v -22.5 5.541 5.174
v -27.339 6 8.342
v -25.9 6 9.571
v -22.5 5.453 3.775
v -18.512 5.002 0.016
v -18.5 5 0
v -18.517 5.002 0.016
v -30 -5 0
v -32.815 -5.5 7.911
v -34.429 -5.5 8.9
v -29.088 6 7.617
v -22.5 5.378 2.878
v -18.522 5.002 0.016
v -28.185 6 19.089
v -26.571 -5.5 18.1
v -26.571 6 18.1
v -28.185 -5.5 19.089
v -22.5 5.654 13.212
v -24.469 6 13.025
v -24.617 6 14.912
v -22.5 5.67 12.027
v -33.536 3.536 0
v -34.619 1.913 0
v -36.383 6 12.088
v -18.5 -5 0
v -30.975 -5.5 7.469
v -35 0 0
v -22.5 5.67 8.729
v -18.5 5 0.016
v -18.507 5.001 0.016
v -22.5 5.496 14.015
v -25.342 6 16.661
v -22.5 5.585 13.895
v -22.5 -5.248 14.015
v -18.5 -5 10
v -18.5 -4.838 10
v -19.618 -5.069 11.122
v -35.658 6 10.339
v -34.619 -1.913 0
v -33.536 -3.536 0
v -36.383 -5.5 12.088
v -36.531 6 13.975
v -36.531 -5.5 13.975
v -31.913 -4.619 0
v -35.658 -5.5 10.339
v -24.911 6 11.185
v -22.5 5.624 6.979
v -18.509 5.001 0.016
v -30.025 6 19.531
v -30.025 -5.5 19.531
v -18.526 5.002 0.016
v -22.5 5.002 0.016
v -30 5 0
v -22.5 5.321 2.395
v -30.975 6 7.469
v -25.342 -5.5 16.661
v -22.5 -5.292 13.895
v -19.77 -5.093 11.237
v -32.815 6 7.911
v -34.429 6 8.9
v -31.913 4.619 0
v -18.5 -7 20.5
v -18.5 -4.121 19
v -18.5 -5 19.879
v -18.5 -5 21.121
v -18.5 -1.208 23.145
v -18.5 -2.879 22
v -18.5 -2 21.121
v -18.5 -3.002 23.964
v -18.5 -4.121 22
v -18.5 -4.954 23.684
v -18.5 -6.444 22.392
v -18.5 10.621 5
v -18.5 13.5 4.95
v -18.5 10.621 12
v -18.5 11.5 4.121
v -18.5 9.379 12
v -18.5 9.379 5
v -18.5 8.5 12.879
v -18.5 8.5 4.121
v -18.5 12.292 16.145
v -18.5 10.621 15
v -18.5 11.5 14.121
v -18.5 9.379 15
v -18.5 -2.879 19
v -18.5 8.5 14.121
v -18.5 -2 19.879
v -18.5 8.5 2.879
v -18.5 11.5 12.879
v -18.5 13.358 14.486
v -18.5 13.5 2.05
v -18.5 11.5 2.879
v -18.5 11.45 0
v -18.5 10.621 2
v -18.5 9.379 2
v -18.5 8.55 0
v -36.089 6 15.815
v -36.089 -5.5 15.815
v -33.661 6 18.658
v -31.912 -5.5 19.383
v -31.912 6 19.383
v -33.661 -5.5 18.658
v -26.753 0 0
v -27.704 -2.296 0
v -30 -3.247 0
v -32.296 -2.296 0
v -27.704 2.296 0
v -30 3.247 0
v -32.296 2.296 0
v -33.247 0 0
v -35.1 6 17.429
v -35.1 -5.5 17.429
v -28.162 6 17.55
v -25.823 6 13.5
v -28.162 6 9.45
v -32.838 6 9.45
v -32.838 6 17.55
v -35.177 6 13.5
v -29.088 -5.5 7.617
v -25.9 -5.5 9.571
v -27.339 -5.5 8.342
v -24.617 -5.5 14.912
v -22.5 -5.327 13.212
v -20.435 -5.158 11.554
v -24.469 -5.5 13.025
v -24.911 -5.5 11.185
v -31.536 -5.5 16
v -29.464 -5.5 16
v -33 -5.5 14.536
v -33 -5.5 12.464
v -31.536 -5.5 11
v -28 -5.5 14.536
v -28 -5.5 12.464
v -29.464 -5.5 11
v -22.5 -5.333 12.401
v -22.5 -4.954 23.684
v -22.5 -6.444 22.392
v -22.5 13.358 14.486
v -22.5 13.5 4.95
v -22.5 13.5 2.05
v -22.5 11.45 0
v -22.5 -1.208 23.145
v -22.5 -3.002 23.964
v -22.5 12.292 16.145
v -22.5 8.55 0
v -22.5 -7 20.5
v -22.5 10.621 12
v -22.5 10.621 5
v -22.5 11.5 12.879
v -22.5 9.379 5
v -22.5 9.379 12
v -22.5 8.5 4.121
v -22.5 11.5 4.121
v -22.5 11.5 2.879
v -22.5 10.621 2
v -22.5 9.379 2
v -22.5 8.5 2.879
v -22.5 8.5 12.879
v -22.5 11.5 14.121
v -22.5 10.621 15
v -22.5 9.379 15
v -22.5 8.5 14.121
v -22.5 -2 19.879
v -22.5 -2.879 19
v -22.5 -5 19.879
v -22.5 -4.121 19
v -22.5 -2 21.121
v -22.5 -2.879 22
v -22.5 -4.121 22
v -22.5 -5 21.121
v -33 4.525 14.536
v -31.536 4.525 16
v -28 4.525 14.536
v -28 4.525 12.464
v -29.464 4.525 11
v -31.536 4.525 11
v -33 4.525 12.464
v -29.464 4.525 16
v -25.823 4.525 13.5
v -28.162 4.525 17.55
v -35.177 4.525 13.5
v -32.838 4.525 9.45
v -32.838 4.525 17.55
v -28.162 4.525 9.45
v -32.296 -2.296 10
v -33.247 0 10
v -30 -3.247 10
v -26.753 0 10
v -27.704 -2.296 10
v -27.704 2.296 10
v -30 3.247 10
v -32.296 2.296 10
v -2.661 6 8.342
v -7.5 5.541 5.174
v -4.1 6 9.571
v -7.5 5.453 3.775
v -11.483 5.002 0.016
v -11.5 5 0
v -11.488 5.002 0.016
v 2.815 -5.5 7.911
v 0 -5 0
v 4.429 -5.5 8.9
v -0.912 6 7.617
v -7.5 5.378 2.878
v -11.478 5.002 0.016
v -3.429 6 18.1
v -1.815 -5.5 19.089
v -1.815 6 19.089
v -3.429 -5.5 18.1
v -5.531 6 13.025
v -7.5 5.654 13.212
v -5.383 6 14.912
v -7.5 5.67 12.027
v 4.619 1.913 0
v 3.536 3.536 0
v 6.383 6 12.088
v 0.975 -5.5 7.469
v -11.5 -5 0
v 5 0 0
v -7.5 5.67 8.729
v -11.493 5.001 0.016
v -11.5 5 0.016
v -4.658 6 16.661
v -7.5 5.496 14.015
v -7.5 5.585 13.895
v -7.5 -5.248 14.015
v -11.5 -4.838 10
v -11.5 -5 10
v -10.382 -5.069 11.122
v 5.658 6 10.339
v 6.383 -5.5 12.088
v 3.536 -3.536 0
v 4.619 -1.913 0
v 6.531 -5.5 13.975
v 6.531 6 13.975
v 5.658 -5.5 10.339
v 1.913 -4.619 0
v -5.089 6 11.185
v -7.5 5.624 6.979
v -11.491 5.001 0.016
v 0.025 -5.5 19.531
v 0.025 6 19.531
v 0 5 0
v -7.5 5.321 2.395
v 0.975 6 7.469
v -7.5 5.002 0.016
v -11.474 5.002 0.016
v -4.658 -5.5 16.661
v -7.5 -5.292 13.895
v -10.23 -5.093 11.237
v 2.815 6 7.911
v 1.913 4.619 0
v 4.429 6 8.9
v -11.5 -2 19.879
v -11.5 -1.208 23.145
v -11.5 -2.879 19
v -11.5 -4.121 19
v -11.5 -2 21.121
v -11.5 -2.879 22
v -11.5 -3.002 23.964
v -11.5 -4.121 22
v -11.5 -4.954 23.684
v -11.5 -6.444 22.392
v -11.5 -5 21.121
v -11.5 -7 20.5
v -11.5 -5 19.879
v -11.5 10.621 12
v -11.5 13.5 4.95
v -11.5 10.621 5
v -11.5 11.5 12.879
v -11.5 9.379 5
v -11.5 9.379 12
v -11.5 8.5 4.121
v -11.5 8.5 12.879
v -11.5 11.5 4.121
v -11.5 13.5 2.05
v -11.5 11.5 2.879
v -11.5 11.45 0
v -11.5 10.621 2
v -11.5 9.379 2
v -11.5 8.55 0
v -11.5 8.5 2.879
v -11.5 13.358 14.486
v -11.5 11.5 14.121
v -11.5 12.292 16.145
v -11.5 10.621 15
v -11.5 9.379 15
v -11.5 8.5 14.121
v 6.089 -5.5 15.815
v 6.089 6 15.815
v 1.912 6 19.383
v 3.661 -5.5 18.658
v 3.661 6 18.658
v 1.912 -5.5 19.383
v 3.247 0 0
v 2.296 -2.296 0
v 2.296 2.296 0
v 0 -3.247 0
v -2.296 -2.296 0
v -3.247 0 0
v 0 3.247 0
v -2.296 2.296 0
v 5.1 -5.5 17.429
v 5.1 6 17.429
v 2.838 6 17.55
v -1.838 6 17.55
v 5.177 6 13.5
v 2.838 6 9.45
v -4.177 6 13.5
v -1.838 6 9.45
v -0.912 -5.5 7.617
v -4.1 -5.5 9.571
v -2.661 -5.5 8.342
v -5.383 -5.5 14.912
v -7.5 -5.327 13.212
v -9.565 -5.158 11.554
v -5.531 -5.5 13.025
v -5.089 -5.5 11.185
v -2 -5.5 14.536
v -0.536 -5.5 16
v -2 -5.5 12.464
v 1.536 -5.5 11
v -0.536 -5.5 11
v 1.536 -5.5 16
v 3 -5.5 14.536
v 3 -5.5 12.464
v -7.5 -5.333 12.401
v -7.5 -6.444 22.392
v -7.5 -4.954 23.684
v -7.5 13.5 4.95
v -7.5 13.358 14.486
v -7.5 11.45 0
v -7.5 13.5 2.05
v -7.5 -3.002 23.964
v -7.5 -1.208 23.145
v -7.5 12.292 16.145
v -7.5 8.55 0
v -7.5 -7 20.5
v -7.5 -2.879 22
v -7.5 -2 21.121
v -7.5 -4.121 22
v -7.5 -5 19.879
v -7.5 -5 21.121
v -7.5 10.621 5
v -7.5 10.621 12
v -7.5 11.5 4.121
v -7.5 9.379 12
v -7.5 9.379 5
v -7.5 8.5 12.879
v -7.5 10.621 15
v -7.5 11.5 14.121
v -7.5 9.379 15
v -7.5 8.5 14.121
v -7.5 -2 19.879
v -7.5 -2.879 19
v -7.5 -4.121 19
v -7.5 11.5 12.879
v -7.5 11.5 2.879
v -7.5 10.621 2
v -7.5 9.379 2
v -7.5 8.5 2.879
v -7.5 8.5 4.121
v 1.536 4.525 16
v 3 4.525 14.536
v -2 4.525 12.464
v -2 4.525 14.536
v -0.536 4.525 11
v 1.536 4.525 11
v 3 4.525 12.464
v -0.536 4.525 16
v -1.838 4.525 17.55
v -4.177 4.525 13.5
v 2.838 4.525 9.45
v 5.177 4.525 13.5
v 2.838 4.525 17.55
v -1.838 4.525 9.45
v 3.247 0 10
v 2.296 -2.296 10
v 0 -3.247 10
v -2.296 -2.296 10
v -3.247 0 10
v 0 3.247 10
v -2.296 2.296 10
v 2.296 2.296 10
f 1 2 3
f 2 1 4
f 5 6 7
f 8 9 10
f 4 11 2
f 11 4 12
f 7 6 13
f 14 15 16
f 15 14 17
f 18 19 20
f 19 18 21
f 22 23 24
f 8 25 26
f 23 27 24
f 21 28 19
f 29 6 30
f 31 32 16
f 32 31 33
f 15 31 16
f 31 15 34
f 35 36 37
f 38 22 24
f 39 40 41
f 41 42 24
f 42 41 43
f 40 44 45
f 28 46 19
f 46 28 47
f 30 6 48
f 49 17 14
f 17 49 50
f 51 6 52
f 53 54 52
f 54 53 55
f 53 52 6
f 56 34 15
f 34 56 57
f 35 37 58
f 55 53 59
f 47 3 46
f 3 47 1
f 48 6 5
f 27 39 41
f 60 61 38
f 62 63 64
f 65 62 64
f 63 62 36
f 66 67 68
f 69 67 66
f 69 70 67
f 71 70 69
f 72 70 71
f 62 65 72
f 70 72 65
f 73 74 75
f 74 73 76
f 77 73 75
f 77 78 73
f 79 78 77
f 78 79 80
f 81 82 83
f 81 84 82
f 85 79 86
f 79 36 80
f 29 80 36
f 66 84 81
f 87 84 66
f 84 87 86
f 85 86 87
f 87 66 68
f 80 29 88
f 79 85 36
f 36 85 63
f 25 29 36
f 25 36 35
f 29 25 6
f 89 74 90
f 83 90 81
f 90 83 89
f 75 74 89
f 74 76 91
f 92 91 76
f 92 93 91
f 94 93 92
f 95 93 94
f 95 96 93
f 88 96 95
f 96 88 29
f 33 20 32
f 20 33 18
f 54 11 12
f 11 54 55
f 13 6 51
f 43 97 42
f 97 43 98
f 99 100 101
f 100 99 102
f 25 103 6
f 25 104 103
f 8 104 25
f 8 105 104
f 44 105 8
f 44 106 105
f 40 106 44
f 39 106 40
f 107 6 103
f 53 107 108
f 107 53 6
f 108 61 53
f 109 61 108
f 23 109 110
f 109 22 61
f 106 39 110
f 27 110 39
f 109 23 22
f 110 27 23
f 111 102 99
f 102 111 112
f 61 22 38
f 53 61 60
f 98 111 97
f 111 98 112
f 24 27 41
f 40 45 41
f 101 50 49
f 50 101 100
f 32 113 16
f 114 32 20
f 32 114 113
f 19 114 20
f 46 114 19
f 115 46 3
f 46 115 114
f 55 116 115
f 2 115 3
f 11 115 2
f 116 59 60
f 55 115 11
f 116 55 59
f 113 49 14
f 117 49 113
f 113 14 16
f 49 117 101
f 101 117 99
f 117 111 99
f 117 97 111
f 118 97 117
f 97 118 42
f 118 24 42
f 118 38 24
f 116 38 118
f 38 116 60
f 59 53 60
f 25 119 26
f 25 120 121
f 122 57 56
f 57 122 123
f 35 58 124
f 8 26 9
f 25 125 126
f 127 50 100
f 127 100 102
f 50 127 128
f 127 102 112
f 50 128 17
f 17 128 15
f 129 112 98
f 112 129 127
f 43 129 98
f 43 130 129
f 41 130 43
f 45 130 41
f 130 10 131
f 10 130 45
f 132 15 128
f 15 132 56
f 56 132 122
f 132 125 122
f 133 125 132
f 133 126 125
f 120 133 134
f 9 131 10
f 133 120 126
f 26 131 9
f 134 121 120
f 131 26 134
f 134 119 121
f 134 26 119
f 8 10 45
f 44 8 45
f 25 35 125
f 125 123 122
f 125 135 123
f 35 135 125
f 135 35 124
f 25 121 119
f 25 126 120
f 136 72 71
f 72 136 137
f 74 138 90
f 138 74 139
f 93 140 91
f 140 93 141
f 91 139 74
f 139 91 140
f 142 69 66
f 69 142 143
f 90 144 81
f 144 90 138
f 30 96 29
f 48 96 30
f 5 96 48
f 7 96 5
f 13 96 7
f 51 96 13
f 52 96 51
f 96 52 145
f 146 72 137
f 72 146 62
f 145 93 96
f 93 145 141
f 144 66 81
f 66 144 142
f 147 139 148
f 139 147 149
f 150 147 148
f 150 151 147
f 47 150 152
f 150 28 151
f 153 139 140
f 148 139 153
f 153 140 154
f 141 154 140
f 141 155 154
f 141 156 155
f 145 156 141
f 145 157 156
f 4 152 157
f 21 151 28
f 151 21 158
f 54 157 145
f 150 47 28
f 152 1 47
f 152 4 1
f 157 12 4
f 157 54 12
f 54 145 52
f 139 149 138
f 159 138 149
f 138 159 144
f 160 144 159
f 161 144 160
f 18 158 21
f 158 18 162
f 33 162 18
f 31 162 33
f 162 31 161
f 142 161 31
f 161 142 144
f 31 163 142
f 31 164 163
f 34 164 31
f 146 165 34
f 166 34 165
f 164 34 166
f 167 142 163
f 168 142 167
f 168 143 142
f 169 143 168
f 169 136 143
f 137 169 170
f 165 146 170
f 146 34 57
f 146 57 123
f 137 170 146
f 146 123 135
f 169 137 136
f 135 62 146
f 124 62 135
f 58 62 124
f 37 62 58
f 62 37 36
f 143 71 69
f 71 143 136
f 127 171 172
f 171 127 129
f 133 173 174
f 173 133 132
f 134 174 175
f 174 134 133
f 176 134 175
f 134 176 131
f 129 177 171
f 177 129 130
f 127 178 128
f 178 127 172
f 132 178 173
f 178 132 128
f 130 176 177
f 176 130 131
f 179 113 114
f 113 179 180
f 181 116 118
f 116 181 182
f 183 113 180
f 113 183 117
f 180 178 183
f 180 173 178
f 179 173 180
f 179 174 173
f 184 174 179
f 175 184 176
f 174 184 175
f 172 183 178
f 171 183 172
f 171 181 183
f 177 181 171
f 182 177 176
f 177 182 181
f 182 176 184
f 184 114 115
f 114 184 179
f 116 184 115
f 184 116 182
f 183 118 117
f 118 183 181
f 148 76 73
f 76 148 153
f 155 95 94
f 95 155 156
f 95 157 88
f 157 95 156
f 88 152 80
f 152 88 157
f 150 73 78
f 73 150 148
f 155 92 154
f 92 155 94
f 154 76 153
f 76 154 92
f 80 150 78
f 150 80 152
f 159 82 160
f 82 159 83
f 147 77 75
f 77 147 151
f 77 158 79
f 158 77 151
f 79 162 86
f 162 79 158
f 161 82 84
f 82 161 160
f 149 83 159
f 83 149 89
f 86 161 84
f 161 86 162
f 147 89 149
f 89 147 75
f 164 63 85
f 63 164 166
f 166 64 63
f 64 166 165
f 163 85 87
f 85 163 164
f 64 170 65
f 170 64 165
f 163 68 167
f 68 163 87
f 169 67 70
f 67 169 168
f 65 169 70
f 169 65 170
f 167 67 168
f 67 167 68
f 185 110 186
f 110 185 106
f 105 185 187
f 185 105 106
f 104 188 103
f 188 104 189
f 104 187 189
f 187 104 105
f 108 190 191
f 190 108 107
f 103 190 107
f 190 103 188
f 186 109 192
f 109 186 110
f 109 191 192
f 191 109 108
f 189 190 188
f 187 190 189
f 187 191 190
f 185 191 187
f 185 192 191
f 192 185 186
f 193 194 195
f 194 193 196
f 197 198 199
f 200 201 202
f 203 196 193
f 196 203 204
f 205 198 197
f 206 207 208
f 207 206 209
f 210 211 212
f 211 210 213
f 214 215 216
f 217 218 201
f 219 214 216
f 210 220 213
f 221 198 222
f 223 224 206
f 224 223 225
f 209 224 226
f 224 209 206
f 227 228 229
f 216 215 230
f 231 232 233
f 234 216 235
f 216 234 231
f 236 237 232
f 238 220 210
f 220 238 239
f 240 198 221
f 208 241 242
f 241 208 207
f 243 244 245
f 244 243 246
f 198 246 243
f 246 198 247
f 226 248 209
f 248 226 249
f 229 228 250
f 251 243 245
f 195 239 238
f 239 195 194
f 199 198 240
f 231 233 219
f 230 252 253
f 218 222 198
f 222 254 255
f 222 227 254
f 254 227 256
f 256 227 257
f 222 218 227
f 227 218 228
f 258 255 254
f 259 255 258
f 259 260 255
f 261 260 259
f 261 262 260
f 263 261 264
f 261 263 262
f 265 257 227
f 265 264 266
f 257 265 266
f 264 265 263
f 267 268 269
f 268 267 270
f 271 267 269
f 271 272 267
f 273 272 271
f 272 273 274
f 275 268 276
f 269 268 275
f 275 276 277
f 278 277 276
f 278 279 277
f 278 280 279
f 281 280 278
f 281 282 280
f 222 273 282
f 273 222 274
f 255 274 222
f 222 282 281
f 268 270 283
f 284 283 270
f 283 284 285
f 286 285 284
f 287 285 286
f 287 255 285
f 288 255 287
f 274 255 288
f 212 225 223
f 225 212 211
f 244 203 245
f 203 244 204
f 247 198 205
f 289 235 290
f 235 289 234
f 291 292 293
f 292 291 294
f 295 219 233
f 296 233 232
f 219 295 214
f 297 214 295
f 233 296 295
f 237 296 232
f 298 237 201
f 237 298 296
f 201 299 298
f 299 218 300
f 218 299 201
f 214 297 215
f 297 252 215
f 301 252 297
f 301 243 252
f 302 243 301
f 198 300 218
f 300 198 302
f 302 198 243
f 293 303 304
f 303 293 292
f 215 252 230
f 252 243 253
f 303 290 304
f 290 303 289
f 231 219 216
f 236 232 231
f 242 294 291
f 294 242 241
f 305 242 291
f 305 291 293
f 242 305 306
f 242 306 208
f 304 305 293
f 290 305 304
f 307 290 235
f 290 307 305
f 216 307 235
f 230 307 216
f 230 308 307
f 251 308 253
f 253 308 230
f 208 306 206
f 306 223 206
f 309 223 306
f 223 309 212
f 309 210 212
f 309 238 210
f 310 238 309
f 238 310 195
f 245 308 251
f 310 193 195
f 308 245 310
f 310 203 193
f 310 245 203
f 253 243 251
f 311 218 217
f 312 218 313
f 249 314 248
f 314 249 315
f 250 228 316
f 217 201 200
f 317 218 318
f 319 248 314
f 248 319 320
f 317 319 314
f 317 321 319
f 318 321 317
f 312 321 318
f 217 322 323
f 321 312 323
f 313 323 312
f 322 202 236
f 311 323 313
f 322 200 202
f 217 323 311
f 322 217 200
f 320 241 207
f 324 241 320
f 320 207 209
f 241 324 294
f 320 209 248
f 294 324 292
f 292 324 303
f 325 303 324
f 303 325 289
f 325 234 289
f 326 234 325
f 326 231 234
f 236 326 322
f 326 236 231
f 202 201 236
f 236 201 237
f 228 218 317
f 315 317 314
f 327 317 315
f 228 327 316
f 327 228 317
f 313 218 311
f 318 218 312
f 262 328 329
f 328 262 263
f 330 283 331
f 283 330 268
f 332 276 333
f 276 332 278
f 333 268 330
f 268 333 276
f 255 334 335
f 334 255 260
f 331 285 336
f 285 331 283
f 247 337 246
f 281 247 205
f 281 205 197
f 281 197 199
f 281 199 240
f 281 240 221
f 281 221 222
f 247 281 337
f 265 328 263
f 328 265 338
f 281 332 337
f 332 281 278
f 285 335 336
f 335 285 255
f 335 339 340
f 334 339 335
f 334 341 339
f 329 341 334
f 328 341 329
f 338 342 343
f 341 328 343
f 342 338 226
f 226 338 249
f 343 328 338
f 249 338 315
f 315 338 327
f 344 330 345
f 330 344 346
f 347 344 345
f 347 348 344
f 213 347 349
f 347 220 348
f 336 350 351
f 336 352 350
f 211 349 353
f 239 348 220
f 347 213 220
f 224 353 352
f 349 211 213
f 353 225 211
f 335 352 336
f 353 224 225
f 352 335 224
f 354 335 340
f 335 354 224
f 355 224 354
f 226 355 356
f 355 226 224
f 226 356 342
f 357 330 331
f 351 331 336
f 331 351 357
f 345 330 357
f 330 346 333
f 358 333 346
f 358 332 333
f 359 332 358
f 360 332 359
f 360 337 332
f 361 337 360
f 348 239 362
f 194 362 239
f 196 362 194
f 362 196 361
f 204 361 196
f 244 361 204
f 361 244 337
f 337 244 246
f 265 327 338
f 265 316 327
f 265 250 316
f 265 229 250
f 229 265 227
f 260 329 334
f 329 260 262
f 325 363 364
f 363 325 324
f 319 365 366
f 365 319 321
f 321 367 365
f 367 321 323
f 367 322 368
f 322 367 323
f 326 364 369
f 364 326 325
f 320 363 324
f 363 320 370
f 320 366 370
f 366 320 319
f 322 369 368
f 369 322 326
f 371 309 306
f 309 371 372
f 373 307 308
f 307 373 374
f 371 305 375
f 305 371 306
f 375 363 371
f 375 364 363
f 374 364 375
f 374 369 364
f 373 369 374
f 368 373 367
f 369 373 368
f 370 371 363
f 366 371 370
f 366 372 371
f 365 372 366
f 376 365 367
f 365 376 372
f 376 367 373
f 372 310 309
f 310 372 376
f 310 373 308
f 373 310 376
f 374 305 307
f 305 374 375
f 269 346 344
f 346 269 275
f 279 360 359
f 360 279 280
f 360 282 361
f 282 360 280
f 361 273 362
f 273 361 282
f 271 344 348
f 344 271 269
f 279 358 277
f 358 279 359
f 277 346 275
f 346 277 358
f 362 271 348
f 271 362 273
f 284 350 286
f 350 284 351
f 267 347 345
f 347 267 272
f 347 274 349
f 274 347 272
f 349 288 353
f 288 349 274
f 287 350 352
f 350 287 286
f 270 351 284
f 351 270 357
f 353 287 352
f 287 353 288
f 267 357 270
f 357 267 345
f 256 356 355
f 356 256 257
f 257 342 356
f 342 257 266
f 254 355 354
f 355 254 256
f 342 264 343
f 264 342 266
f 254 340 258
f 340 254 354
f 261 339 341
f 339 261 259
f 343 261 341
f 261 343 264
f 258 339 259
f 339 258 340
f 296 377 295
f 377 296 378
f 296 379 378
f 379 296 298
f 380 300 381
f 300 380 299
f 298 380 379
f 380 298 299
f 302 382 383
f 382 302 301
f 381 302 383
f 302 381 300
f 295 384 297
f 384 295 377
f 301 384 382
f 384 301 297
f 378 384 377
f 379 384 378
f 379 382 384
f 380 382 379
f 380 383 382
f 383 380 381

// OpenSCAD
include <main.scad>

module front_ends() {
  for(side=[1,0]) {
    translate([30*-side,0,y_clamp_len]) mirror([side,0,0]) rotate([0,0,-90]) rotate([-90,0,0])
      y_end_front();
  }
}

front_ends();
